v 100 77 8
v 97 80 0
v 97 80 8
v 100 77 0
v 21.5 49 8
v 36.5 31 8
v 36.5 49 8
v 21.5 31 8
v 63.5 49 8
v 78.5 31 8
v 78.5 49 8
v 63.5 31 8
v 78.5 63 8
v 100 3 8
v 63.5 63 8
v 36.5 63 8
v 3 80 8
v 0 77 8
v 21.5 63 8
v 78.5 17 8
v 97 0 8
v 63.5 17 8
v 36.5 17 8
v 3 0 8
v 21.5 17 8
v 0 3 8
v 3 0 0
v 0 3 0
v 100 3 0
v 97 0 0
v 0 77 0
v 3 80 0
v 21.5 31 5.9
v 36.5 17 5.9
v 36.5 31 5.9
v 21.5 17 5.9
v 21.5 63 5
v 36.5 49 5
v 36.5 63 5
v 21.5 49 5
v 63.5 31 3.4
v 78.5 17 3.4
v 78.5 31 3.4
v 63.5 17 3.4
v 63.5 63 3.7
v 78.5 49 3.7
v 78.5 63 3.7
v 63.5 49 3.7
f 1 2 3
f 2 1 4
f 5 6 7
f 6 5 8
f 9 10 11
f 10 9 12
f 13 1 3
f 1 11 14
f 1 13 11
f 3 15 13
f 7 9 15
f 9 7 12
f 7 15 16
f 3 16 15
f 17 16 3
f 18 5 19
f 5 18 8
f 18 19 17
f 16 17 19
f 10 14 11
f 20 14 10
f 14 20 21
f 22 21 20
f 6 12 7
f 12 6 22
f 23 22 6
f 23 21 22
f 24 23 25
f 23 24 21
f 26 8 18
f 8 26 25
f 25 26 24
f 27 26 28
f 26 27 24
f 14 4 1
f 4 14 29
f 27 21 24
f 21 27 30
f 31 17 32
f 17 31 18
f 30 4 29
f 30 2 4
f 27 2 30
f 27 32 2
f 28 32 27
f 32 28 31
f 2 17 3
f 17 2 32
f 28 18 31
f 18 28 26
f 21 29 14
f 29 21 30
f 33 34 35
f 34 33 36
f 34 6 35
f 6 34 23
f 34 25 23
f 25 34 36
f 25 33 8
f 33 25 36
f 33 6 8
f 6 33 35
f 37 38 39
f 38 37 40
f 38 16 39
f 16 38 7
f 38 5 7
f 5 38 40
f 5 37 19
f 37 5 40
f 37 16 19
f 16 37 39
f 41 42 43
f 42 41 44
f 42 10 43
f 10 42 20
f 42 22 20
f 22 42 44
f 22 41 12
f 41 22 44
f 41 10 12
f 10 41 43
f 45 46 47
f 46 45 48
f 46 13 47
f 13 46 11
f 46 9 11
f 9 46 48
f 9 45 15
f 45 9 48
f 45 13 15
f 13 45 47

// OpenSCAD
$fn = 32;

// ----------------------------------------------------------------------
// Windowed plate: 4 voids, 100 x 80 x 8 mm
// ----------------------------------------------------------------------

// --- parameters (mm) ---
plate_l = 100;            // plate length, X
plate_w = 80;             // plate width, Y
plate_t = 8;              // plate thickness, Z
edge_margin = 8;          // wall from the plate edge to any window
win_l = 15;               // pocket length
win_w = 14;               // pocket width
pitch_x = 42;             // grid pitch along X
pitch_y = 32;             // grid pitch along Y
depth_1 = 2.1;            // depth of void 1 (full thickness = through)
depth_2 = 3;              // depth of void 2 (full thickness = through)
depth_3 = 4.6;            // depth of void 3 (full thickness = through)
depth_4 = 4.3;            // depth of void 4 (full thickness = through)
corner_c = 3;             // corner chamfer of the plate
fit_tol = 0.1;            // declared fit tolerance (prompt contract)
free_tol = 0.3;           // declared free tolerance (prompt contract)

profile = [[3, 0], [97, 0], [100, 3], [100, 77], [97, 80], [3, 80], [0, 77], [0, 3]];  // primary outline, 8 points, counter clockwise
void_1 = [[21.5, 17], [36.5, 17], [36.5, 31], [21.5, 31]];  // pocket at grid node 0,0, 4 points
void_2 = [[21.5, 49], [36.5, 49], [36.5, 63], [21.5, 63]];  // pocket at grid node 0,1, 4 points
void_3 = [[63.5, 17], [78.5, 17], [78.5, 31], [63.5, 31]];  // pocket at grid node 1,0, 4 points
void_4 = [[63.5, 49], [78.5, 49], [78.5, 63], [63.5, 63]];  // pocket at grid node 1,1, 4 points

// --- the one profile operation ---
difference() {
  linear_extrude(height = plate_t) polygon(points = profile);
  translate([0, 0, plate_t - depth_1])
    linear_extrude(height = depth_1 + 1) polygon(points = void_1);
  translate([0, 0, plate_t - depth_2])
    linear_extrude(height = depth_2 + 1) polygon(points = void_2);
  translate([0, 0, plate_t - depth_3])
    linear_extrude(height = depth_3 + 1) polygon(points = void_3);
  translate([0, 0, plate_t - depth_4])
    linear_extrude(height = depth_4 + 1) polygon(points = void_4);
}
